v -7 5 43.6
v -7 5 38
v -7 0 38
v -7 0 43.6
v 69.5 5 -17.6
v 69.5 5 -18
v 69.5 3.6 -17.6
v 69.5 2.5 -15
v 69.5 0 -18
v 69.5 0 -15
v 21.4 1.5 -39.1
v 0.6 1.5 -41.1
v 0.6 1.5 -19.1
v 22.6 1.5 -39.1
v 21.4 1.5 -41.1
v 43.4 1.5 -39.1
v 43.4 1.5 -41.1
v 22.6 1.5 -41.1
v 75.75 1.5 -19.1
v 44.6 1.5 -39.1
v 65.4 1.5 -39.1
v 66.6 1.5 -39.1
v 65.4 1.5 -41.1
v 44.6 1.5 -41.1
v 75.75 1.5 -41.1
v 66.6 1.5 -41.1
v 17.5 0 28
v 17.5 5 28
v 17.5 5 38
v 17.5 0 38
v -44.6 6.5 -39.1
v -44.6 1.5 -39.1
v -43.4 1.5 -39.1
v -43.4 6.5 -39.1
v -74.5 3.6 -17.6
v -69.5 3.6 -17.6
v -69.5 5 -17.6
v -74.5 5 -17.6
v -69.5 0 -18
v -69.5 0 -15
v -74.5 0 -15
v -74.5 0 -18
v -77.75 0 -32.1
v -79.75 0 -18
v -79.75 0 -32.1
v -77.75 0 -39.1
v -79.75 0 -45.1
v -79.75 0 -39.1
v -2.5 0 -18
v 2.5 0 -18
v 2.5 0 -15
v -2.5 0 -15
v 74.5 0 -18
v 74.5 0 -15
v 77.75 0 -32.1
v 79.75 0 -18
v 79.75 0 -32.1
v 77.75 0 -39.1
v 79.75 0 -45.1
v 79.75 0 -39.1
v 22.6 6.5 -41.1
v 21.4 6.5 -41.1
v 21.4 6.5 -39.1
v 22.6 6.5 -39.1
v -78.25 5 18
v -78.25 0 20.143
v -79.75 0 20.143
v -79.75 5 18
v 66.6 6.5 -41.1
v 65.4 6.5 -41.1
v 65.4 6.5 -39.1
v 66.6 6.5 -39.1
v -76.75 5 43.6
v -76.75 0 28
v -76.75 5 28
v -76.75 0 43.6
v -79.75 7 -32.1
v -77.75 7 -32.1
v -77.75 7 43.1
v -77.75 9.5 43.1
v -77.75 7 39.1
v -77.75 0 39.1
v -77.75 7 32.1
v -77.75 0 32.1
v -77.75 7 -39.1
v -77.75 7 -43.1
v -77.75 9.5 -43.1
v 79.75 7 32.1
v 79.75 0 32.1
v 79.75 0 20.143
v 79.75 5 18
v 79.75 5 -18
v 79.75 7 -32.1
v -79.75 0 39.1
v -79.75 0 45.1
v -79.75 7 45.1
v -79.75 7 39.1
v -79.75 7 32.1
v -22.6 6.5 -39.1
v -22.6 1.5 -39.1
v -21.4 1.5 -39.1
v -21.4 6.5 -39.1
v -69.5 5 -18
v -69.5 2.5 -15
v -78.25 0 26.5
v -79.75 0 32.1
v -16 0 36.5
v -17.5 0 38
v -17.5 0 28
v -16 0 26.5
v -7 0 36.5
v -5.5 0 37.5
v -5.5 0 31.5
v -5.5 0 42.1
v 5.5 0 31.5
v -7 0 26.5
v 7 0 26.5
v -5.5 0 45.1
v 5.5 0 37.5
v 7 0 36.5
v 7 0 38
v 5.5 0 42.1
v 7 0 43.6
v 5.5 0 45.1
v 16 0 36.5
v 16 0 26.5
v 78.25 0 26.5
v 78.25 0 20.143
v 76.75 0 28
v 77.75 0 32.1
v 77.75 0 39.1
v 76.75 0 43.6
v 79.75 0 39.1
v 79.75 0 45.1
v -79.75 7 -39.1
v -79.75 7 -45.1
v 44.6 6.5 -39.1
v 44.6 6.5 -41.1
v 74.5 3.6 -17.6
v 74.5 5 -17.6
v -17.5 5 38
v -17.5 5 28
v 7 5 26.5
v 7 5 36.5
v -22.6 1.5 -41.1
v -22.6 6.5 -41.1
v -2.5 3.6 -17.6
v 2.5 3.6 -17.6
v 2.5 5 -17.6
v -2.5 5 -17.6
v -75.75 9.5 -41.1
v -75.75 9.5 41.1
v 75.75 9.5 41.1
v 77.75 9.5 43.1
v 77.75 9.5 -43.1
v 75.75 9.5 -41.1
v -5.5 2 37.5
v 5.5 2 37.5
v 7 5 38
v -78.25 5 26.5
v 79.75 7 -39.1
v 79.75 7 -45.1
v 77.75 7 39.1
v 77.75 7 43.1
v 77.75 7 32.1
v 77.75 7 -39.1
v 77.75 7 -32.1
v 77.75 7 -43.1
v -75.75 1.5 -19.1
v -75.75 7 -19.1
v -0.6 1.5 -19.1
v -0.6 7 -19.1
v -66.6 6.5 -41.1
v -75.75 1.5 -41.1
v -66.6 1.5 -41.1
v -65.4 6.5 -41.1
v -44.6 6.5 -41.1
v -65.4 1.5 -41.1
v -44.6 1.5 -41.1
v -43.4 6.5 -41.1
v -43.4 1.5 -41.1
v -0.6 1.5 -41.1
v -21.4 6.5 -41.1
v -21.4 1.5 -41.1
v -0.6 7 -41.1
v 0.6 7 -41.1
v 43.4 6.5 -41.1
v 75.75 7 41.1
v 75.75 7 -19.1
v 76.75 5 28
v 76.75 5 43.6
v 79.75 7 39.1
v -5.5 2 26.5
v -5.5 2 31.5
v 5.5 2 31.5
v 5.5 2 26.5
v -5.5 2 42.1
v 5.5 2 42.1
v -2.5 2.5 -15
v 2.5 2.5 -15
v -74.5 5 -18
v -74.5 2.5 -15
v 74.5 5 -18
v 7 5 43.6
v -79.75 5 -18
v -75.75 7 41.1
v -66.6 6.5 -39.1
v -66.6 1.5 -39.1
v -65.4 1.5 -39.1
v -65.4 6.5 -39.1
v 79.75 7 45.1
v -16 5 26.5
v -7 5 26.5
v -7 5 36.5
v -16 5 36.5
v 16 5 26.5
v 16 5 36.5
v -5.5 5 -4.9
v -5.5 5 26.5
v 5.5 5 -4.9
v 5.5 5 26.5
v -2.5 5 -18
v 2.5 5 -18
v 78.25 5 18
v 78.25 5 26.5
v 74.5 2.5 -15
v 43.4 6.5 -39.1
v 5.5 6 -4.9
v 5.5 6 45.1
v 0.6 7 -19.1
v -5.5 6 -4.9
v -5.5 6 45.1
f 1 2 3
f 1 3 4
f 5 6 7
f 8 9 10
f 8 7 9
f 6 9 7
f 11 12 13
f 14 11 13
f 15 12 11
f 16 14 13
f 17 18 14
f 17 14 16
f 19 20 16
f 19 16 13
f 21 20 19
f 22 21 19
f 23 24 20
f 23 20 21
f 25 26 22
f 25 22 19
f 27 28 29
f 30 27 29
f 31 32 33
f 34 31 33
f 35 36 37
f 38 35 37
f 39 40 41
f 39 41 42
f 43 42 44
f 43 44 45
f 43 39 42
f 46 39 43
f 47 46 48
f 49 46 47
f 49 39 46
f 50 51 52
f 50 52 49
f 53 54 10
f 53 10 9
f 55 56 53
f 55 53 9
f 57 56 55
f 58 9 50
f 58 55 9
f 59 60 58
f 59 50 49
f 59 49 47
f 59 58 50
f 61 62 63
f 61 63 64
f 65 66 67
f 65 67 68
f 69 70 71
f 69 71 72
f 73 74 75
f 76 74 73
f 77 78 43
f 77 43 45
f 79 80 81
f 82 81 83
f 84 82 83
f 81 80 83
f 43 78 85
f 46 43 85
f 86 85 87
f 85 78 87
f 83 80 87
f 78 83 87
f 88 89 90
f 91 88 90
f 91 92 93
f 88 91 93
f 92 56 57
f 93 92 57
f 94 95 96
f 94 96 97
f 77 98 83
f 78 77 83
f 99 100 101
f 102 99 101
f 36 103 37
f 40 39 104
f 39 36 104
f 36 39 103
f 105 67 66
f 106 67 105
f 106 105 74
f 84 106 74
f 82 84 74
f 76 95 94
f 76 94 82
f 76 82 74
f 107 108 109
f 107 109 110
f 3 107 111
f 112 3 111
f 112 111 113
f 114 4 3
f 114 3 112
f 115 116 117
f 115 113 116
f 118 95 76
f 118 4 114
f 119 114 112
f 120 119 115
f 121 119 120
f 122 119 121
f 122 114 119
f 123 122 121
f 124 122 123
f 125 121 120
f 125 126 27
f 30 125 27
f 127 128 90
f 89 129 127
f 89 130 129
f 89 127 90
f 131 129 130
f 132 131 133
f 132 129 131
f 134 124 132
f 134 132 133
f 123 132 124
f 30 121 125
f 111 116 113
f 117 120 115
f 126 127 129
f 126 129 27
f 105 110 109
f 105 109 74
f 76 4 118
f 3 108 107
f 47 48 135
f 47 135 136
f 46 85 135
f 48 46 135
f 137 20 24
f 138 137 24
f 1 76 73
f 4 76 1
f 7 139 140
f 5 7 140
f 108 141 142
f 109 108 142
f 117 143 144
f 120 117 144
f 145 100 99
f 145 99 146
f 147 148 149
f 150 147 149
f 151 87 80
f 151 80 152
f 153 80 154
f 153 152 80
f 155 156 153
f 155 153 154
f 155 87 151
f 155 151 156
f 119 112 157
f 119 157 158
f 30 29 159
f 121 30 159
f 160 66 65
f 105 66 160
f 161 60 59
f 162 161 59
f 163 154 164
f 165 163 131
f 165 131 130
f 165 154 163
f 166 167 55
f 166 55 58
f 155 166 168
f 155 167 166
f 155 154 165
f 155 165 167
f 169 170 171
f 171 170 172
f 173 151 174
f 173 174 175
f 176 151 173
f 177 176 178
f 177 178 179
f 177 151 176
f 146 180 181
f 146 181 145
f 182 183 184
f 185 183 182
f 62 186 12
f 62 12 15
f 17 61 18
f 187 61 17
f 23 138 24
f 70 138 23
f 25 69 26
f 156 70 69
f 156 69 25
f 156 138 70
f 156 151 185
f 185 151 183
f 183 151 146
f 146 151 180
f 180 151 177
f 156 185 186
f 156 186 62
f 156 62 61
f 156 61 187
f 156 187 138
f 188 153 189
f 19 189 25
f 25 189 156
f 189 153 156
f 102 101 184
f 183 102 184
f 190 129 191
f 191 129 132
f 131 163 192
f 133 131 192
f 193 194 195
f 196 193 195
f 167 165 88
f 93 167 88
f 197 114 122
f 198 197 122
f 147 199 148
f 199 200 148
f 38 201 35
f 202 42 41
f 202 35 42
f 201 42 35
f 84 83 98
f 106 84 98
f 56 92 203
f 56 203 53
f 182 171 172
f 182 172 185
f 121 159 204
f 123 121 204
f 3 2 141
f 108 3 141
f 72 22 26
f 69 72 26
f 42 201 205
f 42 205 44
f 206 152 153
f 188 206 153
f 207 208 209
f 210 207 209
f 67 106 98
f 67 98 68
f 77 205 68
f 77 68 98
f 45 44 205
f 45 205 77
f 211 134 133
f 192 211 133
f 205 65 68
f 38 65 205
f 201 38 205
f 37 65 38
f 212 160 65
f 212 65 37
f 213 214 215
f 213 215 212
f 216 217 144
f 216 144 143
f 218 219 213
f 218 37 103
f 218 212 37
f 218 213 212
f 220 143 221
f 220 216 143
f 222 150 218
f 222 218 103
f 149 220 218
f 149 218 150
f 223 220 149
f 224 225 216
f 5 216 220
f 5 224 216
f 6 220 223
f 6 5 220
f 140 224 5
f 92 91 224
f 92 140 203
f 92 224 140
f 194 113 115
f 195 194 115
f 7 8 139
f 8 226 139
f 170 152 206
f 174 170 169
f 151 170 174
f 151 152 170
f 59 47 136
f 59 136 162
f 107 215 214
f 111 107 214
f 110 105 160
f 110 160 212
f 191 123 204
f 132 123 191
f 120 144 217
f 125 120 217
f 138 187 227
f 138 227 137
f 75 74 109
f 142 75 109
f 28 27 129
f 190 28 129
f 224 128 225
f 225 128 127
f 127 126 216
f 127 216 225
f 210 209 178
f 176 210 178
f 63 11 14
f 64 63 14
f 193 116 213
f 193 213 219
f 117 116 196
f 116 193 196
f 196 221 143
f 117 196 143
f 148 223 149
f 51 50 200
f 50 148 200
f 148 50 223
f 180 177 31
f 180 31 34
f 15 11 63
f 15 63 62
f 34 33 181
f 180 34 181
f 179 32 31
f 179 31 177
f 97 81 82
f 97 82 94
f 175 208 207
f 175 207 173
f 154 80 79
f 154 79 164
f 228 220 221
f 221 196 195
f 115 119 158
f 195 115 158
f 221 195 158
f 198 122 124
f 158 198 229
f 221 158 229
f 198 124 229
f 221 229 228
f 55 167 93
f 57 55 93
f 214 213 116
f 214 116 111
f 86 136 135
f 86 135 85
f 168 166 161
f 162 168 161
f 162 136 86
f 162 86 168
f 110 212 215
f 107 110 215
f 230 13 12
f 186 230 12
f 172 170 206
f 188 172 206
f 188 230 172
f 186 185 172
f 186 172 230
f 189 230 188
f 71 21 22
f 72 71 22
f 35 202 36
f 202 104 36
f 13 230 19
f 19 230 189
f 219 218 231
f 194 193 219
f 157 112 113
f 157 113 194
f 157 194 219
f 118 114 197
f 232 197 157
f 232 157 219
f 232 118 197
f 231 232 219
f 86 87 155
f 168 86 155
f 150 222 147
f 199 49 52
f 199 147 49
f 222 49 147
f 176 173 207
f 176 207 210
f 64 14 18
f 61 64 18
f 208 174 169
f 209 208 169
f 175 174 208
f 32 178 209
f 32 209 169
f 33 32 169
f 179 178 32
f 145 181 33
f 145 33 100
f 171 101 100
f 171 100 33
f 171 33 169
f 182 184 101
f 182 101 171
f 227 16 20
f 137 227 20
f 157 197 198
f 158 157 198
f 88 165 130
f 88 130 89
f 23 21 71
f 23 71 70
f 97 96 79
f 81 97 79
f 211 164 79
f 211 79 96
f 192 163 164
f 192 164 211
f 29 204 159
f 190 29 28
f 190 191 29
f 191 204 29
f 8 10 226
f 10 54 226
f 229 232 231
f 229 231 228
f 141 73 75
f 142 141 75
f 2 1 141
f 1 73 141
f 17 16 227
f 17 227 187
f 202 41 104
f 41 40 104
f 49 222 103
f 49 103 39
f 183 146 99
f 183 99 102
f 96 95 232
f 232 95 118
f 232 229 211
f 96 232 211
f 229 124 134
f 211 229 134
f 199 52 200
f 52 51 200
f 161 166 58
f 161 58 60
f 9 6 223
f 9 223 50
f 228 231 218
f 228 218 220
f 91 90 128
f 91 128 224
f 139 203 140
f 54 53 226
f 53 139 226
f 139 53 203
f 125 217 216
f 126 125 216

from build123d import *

# Parameters (mm, degrees)
SKETCH_1_W                 = 159.5
SKETCH_1_H                 = 90.2
EXTRUDE_1_DEPTH            = 9.5
SKETCH_2_W                 = 163.5
SKETCH_2_H                 = 94.2
SKETCH_2_W_2               = 155.5
SKETCH_2_H_2               = 86.2
CUT_EXTRUDE_1_DEPTH        = 2.5
SKETCH_3_W                 = 151.5
SKETCH_3_H                 = 82.2
CUT_EXTRUDE_2_DEPTH        = 2.5
SKETCH_4_W                 = 151.5
SKETCH_4_H                 = 22
CUT_EXTRUDE_3_DEPTH        = 5.5
SKETCH_5_W                 = 1.2
SKETCH_5_H                 = 22
EXTRUDE_2_DEPTH            = 5.5
SKETCH_7_W                 = 1.2
SKETCH_7_H                 = 2
EXTRUDE_4_DEPTH            = 5
PATTERN_LINEAR_1_COUNT     = 4
PATTERN_LINEAR_1_PITCH     = 22
PATTERN_LINEAR_1_COL_COUNT = 4
PATTERN_LINEAR_1_COL_PITCH = 22
SKETCH_8_W                 = 2
SKETCH_8_H                 = 7
CUT_EXTRUDE_4_DEPTH        = 92.886193196
CUT_EXTRUDE_5_DEPTH        = 167.025630551
EXTRUDE_5_DEPTH            = 2.5
PATTERN_LINEAR_2_COUNT     = 2
PATTERN_LINEAR_2_PITCH     = 72
PATTERN_LINEAR_2_COL_COUNT = 2
PATTERN_LINEAR_2_COL_PITCH = 72
SKETCH_11_W                = 153.5
SKETCH_11_H                = 15.6
CUT_EXTRUDE_6_DEPTH        = 5
SKETCH_12_W                = 156.5
SKETCH_12_H                = 10
CUT_EXTRUDE_7_DEPTH        = 5
SKETCH_13_W                = 32
SKETCH_13_H                = 10
CUT_EXTRUDE_8_DEPTH        = 5
EXTRUDE_6_DEPTH            = 5
SKETCH_15_W                = 14
SKETCH_15_H                = 18.6
EXTRUDE_7_DEPTH            = 5
SKETCH_16_W                = 11
SKETCH_16_H                = 6
SKETCH_16_H_2              = 5
CUT_EXTRUDE_9_DEPTH        = 5
SKETCH_17_W                = 11
SKETCH_17_H                = 4
CUT_EXTRUDE_10_DEPTH       = 50


with BuildPart() as part:
    # Эскиз1 → Бобышка-Вытянуть1 (new body)
    with BuildSketch(Plane(origin=(0, 0, 0), x_dir=(1, 0, 0), z_dir=(0, 1, 0))):
        Rectangle(SKETCH_1_W, SKETCH_1_H)
    extrude(amount=EXTRUDE_1_DEPTH)

    # Эскиз2 → Вырез-Вытянуть1 (cut)
    with BuildSketch(Plane(origin=(0, 9.5, 0), x_dir=(1, 0, 0), z_dir=(0, 1, 0))):
        Rectangle(SKETCH_2_W, SKETCH_2_H)
        Rectangle(SKETCH_2_W_2, SKETCH_2_H_2, mode=Mode.SUBTRACT)
    extrude(amount=-CUT_EXTRUDE_1_DEPTH, mode=Mode.SUBTRACT)

    # Эскиз3 → Вырез-Вытянуть2 (cut)
    with BuildSketch(Plane(origin=(0, 9.5, 0), x_dir=(1, 0, 0), z_dir=(0, 1, 0))):
        Rectangle(SKETCH_3_W, SKETCH_3_H)
    extrude(amount=-CUT_EXTRUDE_2_DEPTH, mode=Mode.SUBTRACT)

    # Эскиз4 → Вырез-Вытянуть3 (cut)
    with BuildSketch(Plane(origin=(0, 7, 0), x_dir=(1, 0, 0), z_dir=(0, 1, 0))):
        with Locations((0, 30.1)):
            Rectangle(SKETCH_4_W, SKETCH_4_H)
    extrude(amount=-CUT_EXTRUDE_3_DEPTH, mode=Mode.SUBTRACT)

    # Эскиз5 → Бобышка-Вытянуть2 (add)
    with BuildSketch(Plane(origin=(0, 1.5, 0), x_dir=(1, 0, 0), z_dir=(0, 1, 0))):
        with Locations((0, 30.1)):
            Rectangle(SKETCH_5_W, SKETCH_5_H)
    extrude(amount=EXTRUDE_2_DEPTH)

    # Эскиз7 → Бобышка-Вытянуть4 (add)
    with BuildSketch(Plane(origin=(0, 1.5, 0), x_dir=(1, 0, 0), z_dir=(0, 1, 0))):
        with Locations((0, 40.1)):
            Rectangle(SKETCH_7_W, SKETCH_7_H)
    extrude_4 = extrude(amount=EXTRUDE_4_DEPTH)

    # Линейный массив1: Бобышка-Вытянуть4 ×4
    with Locations(*[(-i * PATTERN_LINEAR_1_PITCH, 0, 0) for i in range(1, PATTERN_LINEAR_1_COUNT)]):
        add(extrude_4)

    # Линейный массив1 col: Бобышка-Вытянуть4 ×4
    with Locations(*[(i * PATTERN_LINEAR_1_COL_PITCH, 0, 0) for i in range(1, PATTERN_LINEAR_1_COL_COUNT)]):
        add(extrude_4)

    # Эскиз8 → Вырез-Вытянуть4 (cut, through all)
    with BuildSketch(Plane(origin=(0, 7, 0), x_dir=(1, 0, 0), z_dir=(0, 1, 0))):
        with Locations((78.75, 35.6)):
            Rectangle(SKETCH_8_W, SKETCH_8_H)
        with Locations((78.75, -35.6)):
            Rectangle(SKETCH_8_W, SKETCH_8_H)
    cut_extrude_4 = extrude(amount=-CUT_EXTRUDE_4_DEPTH, mode=Mode.SUBTRACT)

    # Зеркальное отражение1: Вырез-Вытянуть4 across plane
    add(cut_extrude_4.mirror(Plane(origin=(0, 0, 0), x_dir=(0, 0, 1), z_dir=(1, 0, 0))), mode=Mode.SUBTRACT)

    # Эскиз9 → Вырез-Вытянуть5 (cut, through all)
    with BuildSketch(Plane(origin=(79.75, 0, 0), x_dir=(0, 0, -1), z_dir=(1, 0, 0))):
        Polygon((-21, -2), (-18, 5), (18, 5), (18, -2), align=None)
    extrude(amount=-CUT_EXTRUDE_5_DEPTH, mode=Mode.SUBTRACT)

    # Эскиз10 → Бобышка-Вытянуть5 (add, symmetric)
    with BuildSketch(Plane(origin=(0, 0, 0), x_dir=(0, 0, -1), z_dir=(1, 0, 0))):
        Polygon((18, 0), (15, 0), (15, 2.5), (17.6, 3.6), (17.6, 5.1), (18.1, 5.1), (18.1, 0), align=None)
    extrude_5 = extrude(amount=EXTRUDE_5_DEPTH, both=True)

    # Линейный массив2: Бобышка-Вытянуть5 ×2
    with Locations(*[(i * PATTERN_LINEAR_2_PITCH, 0, 0) for i in range(1, PATTERN_LINEAR_2_COUNT)]):
        add(extrude_5)

    # Линейный массив2 col: Бобышка-Вытянуть5 ×2
    with Locations(*[(-i * PATTERN_LINEAR_2_COL_PITCH, 0, 0) for i in range(1, PATTERN_LINEAR_2_COL_COUNT)]):
        add(extrude_5)

    # Эскиз11 → Вырез-Вытянуть6 (cut)
    with BuildSketch(Plane.XZ):
        with Locations((0, 35.8)):
            Rectangle(SKETCH_11_W, SKETCH_11_H)
    extrude(amount=-CUT_EXTRUDE_6_DEPTH, mode=Mode.SUBTRACT)

    # Эскиз12 → Вырез-Вытянуть7 (cut)
    with BuildSketch(Plane.XZ):
        with Locations((0, 21.5)):
            Rectangle(SKETCH_12_W, SKETCH_12_H)
    extrude(amount=-CUT_EXTRUDE_7_DEPTH, mode=Mode.SUBTRACT)

    # Эскиз13 → Вырез-Вытянуть8 (cut)
    with BuildSketch(Plane.XZ):
        with Locations((0, 28.6)):
            Rectangle(SKETCH_13_W, SKETCH_13_H)
    extrude(amount=-CUT_EXTRUDE_8_DEPTH, mode=Mode.SUBTRACT)

    # Эскиз14 → Бобышка-Вытянуть6 (add)
    with BuildSketch(Plane.XZ.offset(-5)):
        Polygon((-16, 28), (-16, 36.5), (16, 36.5), (16, 28), (17.5, 28), (17.5, 38), (-17.5, 38), (-17.5, 28), align=None)
    extrude(amount=EXTRUDE_6_DEPTH)

    # Эскиз15 → Бобышка-Вытянуть7 (add)
    with BuildSketch(Plane.XZ.offset(-5)):
        with Locations((0, 35.8)):
            Rectangle(SKETCH_15_W, SKETCH_15_H)
    extrude(amount=EXTRUDE_7_DEPTH)

    # Эскиз16 → Вырез-Вытянуть9 (cut)
    with BuildSketch(Plane.XZ):
        with Locations((0, 34.5)):
            Rectangle(SKETCH_16_W, SKETCH_16_H)
        with Locations((0, 44.6)):
            Rectangle(SKETCH_16_W, SKETCH_16_H_2)
    extrude(amount=-CUT_EXTRUDE_9_DEPTH, mode=Mode.SUBTRACT)

    # Эскиз17 → Вырез-Вытянуть10 (cut)
    with BuildSketch(Plane.XY.offset(45.1)):
        with Locations((0, 4)):
            Rectangle(SKETCH_17_W, SKETCH_17_H)
    extrude(amount=-CUT_EXTRUDE_10_DEPTH, mode=Mode.SUBTRACT)


solid = part.part
